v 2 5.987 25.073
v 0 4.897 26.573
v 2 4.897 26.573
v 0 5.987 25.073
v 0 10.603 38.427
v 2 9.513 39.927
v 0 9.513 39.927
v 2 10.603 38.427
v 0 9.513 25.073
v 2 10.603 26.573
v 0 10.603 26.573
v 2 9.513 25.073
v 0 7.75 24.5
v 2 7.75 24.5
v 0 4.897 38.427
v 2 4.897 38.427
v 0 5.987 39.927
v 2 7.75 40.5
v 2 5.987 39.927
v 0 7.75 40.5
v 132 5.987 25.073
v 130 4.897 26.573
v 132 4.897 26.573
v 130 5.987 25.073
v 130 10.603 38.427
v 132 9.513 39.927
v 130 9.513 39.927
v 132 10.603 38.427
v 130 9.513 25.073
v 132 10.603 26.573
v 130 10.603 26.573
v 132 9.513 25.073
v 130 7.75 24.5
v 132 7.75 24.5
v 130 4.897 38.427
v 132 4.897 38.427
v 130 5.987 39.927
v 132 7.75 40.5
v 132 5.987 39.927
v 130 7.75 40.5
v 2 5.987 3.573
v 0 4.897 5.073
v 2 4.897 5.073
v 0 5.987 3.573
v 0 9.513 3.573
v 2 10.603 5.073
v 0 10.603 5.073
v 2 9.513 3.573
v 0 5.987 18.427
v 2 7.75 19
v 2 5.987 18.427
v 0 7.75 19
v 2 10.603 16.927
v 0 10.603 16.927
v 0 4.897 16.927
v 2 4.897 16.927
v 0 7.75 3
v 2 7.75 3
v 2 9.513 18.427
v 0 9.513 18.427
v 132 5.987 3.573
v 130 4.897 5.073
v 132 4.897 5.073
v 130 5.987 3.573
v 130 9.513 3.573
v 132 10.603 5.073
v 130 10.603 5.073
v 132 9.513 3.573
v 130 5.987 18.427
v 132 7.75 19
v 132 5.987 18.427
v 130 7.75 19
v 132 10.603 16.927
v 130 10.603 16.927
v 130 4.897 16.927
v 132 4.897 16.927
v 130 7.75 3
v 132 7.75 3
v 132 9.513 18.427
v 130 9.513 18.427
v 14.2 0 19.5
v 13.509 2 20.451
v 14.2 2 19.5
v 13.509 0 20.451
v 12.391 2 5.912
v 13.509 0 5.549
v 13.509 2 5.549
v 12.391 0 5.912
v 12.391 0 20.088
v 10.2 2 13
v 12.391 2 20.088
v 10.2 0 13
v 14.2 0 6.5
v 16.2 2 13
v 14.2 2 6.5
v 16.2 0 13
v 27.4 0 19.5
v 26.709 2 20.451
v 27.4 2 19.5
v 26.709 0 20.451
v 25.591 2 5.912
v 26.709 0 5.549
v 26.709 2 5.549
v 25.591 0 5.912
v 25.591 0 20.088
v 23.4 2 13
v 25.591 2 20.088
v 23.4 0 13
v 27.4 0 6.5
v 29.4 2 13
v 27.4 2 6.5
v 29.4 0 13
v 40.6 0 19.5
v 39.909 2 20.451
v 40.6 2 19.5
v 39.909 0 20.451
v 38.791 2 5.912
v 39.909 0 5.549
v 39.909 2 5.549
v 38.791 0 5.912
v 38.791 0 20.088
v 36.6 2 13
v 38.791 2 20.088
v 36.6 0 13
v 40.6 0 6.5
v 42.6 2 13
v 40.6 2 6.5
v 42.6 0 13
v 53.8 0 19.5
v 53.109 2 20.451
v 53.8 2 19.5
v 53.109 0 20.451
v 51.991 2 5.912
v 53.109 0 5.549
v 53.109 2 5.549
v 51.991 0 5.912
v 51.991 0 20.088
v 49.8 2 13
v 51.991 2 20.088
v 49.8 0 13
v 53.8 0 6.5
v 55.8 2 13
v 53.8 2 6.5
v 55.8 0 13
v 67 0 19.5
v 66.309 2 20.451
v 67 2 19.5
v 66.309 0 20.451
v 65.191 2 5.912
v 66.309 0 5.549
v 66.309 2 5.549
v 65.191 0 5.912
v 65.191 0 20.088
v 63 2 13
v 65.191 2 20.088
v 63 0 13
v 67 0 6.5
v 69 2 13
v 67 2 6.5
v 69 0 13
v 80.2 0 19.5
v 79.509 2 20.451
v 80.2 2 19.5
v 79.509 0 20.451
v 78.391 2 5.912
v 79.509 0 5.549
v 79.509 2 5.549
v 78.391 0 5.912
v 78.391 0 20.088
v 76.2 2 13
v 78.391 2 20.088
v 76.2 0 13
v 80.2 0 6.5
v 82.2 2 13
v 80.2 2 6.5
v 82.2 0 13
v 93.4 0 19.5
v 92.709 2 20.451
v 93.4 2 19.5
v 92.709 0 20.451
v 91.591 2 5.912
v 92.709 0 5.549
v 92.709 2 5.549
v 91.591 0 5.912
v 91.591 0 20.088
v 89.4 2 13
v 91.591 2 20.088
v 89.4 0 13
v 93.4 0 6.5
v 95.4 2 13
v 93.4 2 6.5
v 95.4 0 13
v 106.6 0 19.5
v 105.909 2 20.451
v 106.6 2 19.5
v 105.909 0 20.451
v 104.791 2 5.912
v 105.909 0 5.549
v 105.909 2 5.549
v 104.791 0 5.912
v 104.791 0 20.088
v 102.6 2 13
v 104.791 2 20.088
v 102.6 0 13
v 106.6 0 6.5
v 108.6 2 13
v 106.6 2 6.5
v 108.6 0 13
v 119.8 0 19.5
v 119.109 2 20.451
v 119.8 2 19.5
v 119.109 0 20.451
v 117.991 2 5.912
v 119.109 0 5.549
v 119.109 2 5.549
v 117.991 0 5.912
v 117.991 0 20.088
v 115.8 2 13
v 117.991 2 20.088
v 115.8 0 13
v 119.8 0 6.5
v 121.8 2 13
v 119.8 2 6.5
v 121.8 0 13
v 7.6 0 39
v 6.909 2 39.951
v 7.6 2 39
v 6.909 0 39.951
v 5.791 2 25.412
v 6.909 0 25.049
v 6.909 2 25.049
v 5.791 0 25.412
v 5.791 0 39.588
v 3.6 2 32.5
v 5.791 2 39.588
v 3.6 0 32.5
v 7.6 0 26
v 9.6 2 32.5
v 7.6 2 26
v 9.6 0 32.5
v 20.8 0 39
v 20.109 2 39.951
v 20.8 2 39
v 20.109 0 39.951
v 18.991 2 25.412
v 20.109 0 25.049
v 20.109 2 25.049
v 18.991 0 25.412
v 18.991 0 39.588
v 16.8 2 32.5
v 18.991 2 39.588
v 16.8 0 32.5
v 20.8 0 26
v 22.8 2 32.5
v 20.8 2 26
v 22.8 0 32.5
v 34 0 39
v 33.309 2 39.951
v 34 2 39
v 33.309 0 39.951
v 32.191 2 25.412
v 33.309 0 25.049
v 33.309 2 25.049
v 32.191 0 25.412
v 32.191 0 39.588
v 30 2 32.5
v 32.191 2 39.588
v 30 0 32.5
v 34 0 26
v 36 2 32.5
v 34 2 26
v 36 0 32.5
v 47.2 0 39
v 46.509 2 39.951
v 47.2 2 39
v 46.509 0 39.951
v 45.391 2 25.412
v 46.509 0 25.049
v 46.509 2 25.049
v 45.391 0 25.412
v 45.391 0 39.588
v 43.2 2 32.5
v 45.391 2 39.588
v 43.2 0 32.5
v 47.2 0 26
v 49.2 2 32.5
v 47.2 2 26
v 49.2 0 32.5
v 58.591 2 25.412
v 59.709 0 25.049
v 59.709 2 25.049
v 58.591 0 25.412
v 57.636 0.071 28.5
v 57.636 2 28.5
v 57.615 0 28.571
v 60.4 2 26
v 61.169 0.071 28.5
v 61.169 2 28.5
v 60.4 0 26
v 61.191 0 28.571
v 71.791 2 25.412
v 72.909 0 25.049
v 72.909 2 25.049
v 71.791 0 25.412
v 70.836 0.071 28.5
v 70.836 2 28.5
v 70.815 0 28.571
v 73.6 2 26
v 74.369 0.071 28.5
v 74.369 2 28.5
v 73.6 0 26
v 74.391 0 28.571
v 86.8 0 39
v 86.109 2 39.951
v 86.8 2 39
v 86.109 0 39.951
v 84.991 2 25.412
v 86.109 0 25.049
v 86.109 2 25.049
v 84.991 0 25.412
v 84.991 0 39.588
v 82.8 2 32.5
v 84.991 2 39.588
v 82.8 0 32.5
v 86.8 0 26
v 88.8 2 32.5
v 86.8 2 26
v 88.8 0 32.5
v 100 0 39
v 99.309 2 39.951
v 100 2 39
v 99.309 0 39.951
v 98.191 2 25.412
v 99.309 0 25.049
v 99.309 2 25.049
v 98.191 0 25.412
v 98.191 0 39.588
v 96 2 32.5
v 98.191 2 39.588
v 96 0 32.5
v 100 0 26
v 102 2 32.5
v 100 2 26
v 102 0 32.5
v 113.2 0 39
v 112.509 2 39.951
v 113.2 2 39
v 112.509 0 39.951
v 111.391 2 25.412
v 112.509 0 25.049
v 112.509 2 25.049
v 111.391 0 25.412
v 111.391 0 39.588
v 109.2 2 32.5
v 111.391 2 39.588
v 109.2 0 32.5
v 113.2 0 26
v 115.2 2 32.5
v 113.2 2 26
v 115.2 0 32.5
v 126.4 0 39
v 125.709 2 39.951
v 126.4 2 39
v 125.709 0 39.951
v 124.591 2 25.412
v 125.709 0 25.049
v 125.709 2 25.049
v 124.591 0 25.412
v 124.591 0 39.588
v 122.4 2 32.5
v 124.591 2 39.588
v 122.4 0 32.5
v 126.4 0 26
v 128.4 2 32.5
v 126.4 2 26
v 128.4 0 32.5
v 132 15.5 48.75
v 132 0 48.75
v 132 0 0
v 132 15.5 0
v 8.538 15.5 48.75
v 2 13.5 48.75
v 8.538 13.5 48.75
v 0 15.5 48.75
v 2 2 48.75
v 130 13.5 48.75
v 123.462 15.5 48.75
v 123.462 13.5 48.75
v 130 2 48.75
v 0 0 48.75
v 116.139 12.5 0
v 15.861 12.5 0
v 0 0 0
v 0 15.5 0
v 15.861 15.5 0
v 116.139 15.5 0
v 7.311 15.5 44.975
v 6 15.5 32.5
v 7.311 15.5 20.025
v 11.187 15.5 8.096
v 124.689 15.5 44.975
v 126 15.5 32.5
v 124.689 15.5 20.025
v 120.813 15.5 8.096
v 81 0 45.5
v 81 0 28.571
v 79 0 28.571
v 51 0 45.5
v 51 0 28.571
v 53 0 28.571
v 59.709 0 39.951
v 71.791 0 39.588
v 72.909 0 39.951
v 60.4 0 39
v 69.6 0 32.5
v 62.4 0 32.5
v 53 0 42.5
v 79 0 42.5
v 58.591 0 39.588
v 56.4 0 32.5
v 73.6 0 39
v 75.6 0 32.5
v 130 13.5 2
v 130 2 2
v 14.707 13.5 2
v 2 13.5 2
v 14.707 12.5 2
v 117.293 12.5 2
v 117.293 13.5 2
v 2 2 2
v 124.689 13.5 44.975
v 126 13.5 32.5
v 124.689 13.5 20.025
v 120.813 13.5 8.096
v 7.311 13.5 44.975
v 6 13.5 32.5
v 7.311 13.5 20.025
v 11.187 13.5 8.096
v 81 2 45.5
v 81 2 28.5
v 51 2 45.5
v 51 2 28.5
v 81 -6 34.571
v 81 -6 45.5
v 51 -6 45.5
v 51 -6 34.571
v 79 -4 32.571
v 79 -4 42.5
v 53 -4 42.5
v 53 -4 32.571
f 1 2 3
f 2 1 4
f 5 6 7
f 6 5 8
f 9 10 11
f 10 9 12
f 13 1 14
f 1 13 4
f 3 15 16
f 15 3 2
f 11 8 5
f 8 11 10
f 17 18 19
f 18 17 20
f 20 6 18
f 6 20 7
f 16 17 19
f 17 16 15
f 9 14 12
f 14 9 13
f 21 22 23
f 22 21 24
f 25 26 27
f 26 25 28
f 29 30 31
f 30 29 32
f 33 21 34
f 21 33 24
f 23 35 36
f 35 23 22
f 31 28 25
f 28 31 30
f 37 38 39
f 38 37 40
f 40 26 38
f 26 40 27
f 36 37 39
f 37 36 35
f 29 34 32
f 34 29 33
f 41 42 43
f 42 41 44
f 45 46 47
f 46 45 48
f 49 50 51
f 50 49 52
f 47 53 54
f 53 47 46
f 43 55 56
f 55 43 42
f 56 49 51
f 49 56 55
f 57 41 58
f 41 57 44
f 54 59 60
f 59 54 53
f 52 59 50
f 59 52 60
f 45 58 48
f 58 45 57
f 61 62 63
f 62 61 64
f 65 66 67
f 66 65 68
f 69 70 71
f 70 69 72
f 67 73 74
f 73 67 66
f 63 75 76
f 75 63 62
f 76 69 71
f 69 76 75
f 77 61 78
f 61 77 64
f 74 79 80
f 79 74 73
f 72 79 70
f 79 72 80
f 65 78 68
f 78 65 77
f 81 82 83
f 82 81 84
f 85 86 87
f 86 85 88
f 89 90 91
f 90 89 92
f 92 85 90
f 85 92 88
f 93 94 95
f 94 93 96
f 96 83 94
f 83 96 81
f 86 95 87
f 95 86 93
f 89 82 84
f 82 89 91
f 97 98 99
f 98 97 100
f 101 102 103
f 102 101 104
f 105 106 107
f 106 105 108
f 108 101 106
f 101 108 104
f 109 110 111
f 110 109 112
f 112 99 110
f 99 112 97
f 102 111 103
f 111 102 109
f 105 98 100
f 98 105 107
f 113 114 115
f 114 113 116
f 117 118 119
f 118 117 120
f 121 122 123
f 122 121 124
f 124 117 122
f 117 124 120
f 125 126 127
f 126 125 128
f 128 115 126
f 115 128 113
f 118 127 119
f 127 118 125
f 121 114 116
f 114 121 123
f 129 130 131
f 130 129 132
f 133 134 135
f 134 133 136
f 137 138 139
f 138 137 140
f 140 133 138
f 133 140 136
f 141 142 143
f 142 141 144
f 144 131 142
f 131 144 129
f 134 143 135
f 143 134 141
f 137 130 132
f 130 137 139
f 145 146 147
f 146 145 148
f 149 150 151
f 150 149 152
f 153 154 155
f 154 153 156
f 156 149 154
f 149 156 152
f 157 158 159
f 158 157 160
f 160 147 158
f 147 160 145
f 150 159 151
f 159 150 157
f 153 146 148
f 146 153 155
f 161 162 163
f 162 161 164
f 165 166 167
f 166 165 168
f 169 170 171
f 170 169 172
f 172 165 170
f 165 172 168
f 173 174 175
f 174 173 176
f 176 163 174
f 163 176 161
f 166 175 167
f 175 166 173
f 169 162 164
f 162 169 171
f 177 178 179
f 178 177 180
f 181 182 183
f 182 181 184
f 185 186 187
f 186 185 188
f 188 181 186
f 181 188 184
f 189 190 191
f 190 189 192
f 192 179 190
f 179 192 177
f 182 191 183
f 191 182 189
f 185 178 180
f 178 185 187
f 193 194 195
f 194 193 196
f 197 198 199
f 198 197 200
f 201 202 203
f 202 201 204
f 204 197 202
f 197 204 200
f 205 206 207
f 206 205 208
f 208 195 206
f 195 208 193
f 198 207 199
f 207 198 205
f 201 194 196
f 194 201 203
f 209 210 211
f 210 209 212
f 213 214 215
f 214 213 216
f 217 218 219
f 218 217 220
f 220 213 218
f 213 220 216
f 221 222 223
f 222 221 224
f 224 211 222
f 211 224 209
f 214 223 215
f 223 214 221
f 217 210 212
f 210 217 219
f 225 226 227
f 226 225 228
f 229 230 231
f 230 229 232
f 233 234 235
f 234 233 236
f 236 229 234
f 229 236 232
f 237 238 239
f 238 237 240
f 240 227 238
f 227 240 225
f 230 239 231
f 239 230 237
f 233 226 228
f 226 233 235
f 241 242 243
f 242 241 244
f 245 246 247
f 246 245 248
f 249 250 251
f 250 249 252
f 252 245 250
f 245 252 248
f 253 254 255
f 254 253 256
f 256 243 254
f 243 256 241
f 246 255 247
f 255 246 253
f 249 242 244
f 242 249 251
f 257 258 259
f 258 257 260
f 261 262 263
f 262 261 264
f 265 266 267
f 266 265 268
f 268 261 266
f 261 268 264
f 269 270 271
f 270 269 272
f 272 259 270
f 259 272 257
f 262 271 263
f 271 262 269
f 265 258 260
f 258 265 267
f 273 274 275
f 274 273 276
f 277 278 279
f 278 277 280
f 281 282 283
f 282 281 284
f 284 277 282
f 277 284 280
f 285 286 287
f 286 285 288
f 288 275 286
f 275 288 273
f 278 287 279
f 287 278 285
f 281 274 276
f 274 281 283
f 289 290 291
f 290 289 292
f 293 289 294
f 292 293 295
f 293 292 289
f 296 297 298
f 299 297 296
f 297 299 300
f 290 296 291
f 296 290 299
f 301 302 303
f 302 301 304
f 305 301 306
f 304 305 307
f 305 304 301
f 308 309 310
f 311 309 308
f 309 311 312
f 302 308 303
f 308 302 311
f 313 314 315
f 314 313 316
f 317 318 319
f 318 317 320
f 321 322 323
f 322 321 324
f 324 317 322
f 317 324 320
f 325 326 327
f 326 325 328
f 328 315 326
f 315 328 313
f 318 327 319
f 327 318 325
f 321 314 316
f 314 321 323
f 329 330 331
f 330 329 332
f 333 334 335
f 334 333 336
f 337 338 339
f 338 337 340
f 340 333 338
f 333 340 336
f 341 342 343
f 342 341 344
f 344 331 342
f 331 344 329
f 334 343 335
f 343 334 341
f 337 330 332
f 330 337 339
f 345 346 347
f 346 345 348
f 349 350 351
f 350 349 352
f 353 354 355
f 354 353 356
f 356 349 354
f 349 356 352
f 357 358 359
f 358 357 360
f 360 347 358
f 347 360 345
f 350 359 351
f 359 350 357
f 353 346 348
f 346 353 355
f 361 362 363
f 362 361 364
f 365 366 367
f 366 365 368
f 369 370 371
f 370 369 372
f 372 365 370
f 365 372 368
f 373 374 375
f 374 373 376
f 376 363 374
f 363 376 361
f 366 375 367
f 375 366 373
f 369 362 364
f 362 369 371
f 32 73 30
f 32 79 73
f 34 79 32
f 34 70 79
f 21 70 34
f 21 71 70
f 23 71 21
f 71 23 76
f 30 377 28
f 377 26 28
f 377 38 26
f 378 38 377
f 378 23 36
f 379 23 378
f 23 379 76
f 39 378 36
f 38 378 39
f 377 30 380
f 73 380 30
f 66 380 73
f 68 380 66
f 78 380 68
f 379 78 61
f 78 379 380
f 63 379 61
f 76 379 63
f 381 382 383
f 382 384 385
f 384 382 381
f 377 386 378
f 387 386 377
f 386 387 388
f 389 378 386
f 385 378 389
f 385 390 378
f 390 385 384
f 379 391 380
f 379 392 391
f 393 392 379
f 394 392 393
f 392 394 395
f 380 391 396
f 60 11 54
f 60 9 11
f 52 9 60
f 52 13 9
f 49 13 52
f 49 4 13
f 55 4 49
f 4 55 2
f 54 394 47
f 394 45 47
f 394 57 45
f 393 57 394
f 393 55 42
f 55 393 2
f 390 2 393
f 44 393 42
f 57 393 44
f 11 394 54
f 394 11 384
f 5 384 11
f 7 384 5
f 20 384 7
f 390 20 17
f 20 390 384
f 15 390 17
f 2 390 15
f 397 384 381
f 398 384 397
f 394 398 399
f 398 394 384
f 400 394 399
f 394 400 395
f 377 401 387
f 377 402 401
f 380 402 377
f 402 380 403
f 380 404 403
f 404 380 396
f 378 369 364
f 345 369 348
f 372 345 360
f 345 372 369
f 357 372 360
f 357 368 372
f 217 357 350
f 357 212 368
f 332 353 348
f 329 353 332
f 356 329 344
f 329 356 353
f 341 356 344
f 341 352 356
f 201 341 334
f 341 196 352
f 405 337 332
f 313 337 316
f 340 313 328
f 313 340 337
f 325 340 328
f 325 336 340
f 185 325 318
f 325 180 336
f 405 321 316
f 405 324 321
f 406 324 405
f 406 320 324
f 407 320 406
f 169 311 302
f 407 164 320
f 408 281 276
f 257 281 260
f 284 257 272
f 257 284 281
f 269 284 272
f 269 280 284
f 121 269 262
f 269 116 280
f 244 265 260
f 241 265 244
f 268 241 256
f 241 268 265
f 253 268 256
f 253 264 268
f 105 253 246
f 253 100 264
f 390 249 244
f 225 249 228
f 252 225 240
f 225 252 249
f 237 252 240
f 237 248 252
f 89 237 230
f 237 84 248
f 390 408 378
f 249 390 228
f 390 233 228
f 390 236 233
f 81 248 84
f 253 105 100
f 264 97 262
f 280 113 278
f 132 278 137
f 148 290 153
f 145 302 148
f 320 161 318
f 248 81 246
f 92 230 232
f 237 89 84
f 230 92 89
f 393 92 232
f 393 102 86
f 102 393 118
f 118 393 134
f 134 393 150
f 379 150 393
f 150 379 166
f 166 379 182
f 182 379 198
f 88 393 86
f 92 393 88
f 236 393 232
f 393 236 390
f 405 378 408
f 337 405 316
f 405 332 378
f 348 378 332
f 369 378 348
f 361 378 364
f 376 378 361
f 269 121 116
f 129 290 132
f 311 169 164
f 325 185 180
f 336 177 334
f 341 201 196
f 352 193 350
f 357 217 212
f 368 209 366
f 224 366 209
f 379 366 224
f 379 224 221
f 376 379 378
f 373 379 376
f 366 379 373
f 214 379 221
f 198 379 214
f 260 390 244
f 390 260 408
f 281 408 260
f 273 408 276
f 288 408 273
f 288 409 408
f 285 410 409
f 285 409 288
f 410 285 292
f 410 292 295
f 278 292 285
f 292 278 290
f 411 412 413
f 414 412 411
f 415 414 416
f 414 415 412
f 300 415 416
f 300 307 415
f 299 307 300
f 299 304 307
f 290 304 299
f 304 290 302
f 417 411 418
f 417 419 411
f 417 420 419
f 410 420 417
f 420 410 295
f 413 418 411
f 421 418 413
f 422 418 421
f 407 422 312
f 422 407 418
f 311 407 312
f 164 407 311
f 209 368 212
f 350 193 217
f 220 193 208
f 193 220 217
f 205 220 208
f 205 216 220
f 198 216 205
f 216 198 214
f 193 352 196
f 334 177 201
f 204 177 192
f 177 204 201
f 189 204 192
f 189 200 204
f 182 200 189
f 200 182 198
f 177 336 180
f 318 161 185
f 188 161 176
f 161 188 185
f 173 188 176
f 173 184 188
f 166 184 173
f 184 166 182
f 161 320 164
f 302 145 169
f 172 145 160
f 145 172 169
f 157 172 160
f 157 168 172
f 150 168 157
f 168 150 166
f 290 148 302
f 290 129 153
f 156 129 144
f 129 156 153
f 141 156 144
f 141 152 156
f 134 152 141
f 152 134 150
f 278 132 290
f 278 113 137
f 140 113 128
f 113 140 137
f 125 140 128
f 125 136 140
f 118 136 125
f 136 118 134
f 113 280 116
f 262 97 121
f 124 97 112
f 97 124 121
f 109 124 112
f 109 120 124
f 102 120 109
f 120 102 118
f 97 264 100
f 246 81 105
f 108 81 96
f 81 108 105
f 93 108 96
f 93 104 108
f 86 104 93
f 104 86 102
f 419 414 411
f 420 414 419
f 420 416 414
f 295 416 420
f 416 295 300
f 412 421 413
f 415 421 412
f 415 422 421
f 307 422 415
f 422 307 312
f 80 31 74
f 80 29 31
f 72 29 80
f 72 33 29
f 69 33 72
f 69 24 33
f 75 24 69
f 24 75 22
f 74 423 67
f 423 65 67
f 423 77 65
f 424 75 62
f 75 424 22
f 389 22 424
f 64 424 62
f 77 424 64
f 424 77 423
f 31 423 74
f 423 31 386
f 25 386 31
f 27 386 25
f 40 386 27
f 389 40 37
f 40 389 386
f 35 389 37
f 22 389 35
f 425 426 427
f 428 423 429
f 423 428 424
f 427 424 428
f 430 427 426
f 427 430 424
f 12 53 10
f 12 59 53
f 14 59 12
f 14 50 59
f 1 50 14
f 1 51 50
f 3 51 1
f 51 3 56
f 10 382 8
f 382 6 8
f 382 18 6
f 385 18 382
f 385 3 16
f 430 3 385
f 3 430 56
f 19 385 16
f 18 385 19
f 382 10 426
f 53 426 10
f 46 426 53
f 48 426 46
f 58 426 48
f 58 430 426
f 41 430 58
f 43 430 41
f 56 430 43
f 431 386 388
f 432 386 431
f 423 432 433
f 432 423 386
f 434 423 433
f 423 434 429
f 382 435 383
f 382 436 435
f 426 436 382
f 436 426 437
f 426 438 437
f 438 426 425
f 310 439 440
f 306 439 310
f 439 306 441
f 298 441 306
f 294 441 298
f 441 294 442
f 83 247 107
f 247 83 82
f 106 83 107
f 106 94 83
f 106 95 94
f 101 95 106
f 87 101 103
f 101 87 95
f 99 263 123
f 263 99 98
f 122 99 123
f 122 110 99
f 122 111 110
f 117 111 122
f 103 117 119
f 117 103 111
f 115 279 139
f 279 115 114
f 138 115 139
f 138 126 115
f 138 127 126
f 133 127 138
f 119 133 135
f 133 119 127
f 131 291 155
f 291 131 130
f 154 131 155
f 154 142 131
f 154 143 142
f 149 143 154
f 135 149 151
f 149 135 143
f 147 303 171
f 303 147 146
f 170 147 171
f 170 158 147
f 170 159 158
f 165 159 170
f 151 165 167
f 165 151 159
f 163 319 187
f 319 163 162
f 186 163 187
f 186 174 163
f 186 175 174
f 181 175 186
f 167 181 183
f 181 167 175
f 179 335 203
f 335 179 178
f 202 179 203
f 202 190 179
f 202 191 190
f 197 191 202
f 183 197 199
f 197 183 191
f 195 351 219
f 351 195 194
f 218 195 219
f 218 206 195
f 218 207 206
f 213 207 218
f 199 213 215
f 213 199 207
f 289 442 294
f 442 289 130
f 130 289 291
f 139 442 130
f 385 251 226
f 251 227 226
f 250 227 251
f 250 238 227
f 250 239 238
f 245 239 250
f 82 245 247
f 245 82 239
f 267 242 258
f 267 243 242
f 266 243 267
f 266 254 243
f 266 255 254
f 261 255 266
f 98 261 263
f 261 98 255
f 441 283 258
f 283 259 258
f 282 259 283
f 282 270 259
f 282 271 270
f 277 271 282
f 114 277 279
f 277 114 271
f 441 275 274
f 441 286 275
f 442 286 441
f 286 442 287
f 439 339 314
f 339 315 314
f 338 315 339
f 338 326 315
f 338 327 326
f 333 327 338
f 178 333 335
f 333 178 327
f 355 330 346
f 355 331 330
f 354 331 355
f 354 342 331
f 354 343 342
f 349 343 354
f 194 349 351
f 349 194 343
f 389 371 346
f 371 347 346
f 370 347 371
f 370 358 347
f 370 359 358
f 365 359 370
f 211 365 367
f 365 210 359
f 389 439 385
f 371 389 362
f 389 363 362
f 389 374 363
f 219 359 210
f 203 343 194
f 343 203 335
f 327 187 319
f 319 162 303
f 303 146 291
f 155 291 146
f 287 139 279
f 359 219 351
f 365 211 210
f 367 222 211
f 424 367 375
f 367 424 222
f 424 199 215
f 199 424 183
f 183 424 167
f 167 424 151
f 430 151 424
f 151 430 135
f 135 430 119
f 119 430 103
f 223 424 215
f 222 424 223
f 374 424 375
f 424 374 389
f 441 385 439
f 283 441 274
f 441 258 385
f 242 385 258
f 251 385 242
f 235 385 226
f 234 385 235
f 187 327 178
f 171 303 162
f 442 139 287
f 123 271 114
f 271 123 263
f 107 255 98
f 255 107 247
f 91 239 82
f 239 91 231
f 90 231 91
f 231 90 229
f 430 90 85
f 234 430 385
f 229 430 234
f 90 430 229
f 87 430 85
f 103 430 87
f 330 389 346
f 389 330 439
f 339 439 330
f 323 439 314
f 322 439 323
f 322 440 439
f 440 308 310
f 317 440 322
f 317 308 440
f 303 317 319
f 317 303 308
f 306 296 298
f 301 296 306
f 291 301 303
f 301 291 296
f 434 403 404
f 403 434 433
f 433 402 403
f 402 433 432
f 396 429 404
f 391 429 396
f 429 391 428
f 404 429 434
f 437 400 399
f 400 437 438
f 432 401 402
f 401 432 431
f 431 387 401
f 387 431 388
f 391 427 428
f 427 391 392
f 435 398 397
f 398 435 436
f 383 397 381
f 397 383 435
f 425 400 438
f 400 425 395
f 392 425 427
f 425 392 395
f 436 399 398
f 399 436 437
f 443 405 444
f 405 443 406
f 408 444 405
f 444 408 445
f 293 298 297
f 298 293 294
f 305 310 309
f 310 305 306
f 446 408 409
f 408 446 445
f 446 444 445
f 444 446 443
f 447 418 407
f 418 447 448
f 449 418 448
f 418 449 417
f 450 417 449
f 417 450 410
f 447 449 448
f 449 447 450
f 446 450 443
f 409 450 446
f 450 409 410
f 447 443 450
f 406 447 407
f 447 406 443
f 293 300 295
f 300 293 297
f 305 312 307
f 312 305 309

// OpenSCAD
// Width of the phone when held in landscape (mm)
iPhoneWidth = 128;	
// Height of the phone when held in landscape (mm)	
iPhoneHeight = 63;
// Thickness of the phone (mm)
iPhoneDepth = 11.5; 
// Slots on Side (pick 2 for iphones)
slots = 2; // [1,2]	

/* [Hidden] */
mountThickness = 2; // How thick to make the base of the mount.

difference() {

// Main Box
	cube([iPhoneWidth+2*mountThickness,iPhoneDepth+2*mountThickness,3/4*(iPhoneHeight+mountThickness)]);
	translate([mountThickness,mountThickness,mountThickness]) cube([iPhoneWidth,iPhoneDepth,iPhoneHeight+mountThickness]);
	
// Front Cutout
	translate([(iPhoneWidth+2*mountThickness)/2,iPhoneDepth+mountThickness-1,(iPhoneHeight+mountThickness)/2])rotate([-90,0,0])cylinder(r=iPhoneWidth/2-4,h=mountThickness+2);

// Dual Slot Logic
    if (slots==2) { 
		// Lightning Adpators
        hull (){
            translate([mountThickness/2,(iPhoneDepth+2*mountThickness)/2, (iPhoneHeight+mountThickness)/2-5]) rotate ([0,90,0]) cylinder(r=3,h=mountThickness+2, center=true);
            translate([mountThickness/2,(iPhoneDepth+2*mountThickness)/2, (iPhoneHeight+mountThickness)/2+5]) rotate ([0,90,0]) cylinder(r=3,h=mountThickness+2, center=true);
        }

        hull () {
            translate([iPhoneWidth+mountThickness*1.5,(iPhoneDepth+2*mountThickness)/2, (iPhoneHeight+mountThickness)/2-5]) rotate ([0,90,0]) cylinder(r=3,h=mountThickness+2, center=true);
            translate([iPhoneWidth+1.5*mountThickness,(iPhoneDepth+2*mountThickness)/2, (iPhoneHeight+mountThickness)/2+5]) rotate ([0,90,0]) cylinder(r=3,h=mountThickness+2, center=true);
        }

		// Power Buttons
        hull () {
            translate([mountThickness/2,(iPhoneDepth+2*mountThickness)/2, mountThickness+4]) rotate ([0,90,0]) cylinder(r=3,h=mountThickness+2, center=true);
            translate([mountThickness/2,(iPhoneDepth+2*mountThickness)/2,mountThickness+14]) rotate ([0,90,0]) cylinder(r=3,h=mountThickness+2, center=true);
        }

        hull () {
            translate([iPhoneWidth+mountThickness*1.5,(iPhoneDepth+2*mountThickness)/2, mountThickness+4]) rotate ([0,90,0]) cylinder(r=3,h=mountThickness+2, center=true);
            translate([iPhoneWidth+1.5*mountThickness,(iPhoneDepth+2*mountThickness)/2, mountThickness+14]) rotate ([0,90,0]) cylinder(r=3,h=mountThickness+2, center=true);
        }
    }

// Single Slot Logic
    if (slots==1) {
    hull () {
            translate([mountThickness/2,(iPhoneDepth+2*mountThickness)/2, mountThickness+4]) rotate ([0,90,0]) cylinder(r=3,h=mountThickness+2, center=true);
            translate([mountThickness/2,(iPhoneDepth+2*mountThickness)/2,iPhoneHeight*3/4-5]) rotate ([0,90,0]) cylinder(r=3,h=mountThickness+2, center=true);
        }

        hull () {
            translate([iPhoneWidth+mountThickness*1.5,(iPhoneDepth+2*mountThickness)/2, mountThickness+4]) rotate ([0,90,0]) cylinder(r=3,h=mountThickness+2, center=true);
            translate([iPhoneWidth+1.5*mountThickness,(iPhoneDepth+2*mountThickness)/2, iPhoneHeight*3/4-5]) rotate ([0,90,0]) cylinder(r=3,h=mountThickness+2, center=true);
        }
    }

// Expansion Slots
for (z = [.1,.2,.3,.4,.5,.6,.7,.8,.9]) {
	hull () {
	translate([(iPhoneWidth+2*mountThickness)*z,mountThickness/2, (iPhoneHeight+mountThickness)*.30]) rotate ([90,0,0]) cylinder(r=1,h=mountThickness+2, center=true);
		translate([(iPhoneWidth+2*mountThickness)*z,mountThickness/2, (iPhoneHeight+mountThickness)*.20]) rotate ([90,0,0]) cylinder(r=3,h=mountThickness+2, center=true);
		translate([(iPhoneWidth+2*mountThickness)*z,mountThickness/2, (iPhoneHeight+mountThickness)*.10]) rotate ([90,0,0]) cylinder(r=1,h=mountThickness+2, center=true);
	}
}

for (z = [.05,.15,.25,.35,.45,.55,.65,.75,.85,.95]) {
	hull () {
		translate([(iPhoneWidth+2*mountThickness)*z,mountThickness/2, (iPhoneHeight+mountThickness)*.6]) rotate ([90,0,0]) cylinder(r=1,h=mountThickness+2, center=true);
		translate([(iPhoneWidth+2*mountThickness)*z,mountThickness/2, (iPhoneHeight+mountThickness)*.5]) rotate ([90,0,0]) cylinder(r=3,h=mountThickness+2, center=true);
		translate([(iPhoneWidth+2*mountThickness)*z,mountThickness/2, (iPhoneHeight+mountThickness)*.4]) rotate ([90,0,0]) cylinder(r=1,h=mountThickness+2, center=true);
	}
}


}

// Repair Base
difference() {
		cube([iPhoneWidth+2*mountThickness-4,iPhoneDepth+2*mountThickness-4,iPhoneHeight+mountThickness-4]);
	translate([-2,-2,mountThickness]) cube([iPhoneWidth+2*mountThickness+4,iPhoneDepth+2*mountThickness+4,iPhoneHeight+mountThickness+4]);
}

// Mount Attachement
difference() {
	translate([(iPhoneWidth+2*mountThickness)/2-15,-6,iPhoneHeight/2-3]) cube([30,6+mountThickness,17]);
	translate([(iPhoneWidth+2*mountThickness)/2-13,-4,iPhoneHeight/2-4]) cube([26,4,15]);
	translate([(iPhoneWidth+2*mountThickness)/2-16,0,iPhoneHeight/2-10]) rotate([45,0,0]) cube([32,5,15]);
}
